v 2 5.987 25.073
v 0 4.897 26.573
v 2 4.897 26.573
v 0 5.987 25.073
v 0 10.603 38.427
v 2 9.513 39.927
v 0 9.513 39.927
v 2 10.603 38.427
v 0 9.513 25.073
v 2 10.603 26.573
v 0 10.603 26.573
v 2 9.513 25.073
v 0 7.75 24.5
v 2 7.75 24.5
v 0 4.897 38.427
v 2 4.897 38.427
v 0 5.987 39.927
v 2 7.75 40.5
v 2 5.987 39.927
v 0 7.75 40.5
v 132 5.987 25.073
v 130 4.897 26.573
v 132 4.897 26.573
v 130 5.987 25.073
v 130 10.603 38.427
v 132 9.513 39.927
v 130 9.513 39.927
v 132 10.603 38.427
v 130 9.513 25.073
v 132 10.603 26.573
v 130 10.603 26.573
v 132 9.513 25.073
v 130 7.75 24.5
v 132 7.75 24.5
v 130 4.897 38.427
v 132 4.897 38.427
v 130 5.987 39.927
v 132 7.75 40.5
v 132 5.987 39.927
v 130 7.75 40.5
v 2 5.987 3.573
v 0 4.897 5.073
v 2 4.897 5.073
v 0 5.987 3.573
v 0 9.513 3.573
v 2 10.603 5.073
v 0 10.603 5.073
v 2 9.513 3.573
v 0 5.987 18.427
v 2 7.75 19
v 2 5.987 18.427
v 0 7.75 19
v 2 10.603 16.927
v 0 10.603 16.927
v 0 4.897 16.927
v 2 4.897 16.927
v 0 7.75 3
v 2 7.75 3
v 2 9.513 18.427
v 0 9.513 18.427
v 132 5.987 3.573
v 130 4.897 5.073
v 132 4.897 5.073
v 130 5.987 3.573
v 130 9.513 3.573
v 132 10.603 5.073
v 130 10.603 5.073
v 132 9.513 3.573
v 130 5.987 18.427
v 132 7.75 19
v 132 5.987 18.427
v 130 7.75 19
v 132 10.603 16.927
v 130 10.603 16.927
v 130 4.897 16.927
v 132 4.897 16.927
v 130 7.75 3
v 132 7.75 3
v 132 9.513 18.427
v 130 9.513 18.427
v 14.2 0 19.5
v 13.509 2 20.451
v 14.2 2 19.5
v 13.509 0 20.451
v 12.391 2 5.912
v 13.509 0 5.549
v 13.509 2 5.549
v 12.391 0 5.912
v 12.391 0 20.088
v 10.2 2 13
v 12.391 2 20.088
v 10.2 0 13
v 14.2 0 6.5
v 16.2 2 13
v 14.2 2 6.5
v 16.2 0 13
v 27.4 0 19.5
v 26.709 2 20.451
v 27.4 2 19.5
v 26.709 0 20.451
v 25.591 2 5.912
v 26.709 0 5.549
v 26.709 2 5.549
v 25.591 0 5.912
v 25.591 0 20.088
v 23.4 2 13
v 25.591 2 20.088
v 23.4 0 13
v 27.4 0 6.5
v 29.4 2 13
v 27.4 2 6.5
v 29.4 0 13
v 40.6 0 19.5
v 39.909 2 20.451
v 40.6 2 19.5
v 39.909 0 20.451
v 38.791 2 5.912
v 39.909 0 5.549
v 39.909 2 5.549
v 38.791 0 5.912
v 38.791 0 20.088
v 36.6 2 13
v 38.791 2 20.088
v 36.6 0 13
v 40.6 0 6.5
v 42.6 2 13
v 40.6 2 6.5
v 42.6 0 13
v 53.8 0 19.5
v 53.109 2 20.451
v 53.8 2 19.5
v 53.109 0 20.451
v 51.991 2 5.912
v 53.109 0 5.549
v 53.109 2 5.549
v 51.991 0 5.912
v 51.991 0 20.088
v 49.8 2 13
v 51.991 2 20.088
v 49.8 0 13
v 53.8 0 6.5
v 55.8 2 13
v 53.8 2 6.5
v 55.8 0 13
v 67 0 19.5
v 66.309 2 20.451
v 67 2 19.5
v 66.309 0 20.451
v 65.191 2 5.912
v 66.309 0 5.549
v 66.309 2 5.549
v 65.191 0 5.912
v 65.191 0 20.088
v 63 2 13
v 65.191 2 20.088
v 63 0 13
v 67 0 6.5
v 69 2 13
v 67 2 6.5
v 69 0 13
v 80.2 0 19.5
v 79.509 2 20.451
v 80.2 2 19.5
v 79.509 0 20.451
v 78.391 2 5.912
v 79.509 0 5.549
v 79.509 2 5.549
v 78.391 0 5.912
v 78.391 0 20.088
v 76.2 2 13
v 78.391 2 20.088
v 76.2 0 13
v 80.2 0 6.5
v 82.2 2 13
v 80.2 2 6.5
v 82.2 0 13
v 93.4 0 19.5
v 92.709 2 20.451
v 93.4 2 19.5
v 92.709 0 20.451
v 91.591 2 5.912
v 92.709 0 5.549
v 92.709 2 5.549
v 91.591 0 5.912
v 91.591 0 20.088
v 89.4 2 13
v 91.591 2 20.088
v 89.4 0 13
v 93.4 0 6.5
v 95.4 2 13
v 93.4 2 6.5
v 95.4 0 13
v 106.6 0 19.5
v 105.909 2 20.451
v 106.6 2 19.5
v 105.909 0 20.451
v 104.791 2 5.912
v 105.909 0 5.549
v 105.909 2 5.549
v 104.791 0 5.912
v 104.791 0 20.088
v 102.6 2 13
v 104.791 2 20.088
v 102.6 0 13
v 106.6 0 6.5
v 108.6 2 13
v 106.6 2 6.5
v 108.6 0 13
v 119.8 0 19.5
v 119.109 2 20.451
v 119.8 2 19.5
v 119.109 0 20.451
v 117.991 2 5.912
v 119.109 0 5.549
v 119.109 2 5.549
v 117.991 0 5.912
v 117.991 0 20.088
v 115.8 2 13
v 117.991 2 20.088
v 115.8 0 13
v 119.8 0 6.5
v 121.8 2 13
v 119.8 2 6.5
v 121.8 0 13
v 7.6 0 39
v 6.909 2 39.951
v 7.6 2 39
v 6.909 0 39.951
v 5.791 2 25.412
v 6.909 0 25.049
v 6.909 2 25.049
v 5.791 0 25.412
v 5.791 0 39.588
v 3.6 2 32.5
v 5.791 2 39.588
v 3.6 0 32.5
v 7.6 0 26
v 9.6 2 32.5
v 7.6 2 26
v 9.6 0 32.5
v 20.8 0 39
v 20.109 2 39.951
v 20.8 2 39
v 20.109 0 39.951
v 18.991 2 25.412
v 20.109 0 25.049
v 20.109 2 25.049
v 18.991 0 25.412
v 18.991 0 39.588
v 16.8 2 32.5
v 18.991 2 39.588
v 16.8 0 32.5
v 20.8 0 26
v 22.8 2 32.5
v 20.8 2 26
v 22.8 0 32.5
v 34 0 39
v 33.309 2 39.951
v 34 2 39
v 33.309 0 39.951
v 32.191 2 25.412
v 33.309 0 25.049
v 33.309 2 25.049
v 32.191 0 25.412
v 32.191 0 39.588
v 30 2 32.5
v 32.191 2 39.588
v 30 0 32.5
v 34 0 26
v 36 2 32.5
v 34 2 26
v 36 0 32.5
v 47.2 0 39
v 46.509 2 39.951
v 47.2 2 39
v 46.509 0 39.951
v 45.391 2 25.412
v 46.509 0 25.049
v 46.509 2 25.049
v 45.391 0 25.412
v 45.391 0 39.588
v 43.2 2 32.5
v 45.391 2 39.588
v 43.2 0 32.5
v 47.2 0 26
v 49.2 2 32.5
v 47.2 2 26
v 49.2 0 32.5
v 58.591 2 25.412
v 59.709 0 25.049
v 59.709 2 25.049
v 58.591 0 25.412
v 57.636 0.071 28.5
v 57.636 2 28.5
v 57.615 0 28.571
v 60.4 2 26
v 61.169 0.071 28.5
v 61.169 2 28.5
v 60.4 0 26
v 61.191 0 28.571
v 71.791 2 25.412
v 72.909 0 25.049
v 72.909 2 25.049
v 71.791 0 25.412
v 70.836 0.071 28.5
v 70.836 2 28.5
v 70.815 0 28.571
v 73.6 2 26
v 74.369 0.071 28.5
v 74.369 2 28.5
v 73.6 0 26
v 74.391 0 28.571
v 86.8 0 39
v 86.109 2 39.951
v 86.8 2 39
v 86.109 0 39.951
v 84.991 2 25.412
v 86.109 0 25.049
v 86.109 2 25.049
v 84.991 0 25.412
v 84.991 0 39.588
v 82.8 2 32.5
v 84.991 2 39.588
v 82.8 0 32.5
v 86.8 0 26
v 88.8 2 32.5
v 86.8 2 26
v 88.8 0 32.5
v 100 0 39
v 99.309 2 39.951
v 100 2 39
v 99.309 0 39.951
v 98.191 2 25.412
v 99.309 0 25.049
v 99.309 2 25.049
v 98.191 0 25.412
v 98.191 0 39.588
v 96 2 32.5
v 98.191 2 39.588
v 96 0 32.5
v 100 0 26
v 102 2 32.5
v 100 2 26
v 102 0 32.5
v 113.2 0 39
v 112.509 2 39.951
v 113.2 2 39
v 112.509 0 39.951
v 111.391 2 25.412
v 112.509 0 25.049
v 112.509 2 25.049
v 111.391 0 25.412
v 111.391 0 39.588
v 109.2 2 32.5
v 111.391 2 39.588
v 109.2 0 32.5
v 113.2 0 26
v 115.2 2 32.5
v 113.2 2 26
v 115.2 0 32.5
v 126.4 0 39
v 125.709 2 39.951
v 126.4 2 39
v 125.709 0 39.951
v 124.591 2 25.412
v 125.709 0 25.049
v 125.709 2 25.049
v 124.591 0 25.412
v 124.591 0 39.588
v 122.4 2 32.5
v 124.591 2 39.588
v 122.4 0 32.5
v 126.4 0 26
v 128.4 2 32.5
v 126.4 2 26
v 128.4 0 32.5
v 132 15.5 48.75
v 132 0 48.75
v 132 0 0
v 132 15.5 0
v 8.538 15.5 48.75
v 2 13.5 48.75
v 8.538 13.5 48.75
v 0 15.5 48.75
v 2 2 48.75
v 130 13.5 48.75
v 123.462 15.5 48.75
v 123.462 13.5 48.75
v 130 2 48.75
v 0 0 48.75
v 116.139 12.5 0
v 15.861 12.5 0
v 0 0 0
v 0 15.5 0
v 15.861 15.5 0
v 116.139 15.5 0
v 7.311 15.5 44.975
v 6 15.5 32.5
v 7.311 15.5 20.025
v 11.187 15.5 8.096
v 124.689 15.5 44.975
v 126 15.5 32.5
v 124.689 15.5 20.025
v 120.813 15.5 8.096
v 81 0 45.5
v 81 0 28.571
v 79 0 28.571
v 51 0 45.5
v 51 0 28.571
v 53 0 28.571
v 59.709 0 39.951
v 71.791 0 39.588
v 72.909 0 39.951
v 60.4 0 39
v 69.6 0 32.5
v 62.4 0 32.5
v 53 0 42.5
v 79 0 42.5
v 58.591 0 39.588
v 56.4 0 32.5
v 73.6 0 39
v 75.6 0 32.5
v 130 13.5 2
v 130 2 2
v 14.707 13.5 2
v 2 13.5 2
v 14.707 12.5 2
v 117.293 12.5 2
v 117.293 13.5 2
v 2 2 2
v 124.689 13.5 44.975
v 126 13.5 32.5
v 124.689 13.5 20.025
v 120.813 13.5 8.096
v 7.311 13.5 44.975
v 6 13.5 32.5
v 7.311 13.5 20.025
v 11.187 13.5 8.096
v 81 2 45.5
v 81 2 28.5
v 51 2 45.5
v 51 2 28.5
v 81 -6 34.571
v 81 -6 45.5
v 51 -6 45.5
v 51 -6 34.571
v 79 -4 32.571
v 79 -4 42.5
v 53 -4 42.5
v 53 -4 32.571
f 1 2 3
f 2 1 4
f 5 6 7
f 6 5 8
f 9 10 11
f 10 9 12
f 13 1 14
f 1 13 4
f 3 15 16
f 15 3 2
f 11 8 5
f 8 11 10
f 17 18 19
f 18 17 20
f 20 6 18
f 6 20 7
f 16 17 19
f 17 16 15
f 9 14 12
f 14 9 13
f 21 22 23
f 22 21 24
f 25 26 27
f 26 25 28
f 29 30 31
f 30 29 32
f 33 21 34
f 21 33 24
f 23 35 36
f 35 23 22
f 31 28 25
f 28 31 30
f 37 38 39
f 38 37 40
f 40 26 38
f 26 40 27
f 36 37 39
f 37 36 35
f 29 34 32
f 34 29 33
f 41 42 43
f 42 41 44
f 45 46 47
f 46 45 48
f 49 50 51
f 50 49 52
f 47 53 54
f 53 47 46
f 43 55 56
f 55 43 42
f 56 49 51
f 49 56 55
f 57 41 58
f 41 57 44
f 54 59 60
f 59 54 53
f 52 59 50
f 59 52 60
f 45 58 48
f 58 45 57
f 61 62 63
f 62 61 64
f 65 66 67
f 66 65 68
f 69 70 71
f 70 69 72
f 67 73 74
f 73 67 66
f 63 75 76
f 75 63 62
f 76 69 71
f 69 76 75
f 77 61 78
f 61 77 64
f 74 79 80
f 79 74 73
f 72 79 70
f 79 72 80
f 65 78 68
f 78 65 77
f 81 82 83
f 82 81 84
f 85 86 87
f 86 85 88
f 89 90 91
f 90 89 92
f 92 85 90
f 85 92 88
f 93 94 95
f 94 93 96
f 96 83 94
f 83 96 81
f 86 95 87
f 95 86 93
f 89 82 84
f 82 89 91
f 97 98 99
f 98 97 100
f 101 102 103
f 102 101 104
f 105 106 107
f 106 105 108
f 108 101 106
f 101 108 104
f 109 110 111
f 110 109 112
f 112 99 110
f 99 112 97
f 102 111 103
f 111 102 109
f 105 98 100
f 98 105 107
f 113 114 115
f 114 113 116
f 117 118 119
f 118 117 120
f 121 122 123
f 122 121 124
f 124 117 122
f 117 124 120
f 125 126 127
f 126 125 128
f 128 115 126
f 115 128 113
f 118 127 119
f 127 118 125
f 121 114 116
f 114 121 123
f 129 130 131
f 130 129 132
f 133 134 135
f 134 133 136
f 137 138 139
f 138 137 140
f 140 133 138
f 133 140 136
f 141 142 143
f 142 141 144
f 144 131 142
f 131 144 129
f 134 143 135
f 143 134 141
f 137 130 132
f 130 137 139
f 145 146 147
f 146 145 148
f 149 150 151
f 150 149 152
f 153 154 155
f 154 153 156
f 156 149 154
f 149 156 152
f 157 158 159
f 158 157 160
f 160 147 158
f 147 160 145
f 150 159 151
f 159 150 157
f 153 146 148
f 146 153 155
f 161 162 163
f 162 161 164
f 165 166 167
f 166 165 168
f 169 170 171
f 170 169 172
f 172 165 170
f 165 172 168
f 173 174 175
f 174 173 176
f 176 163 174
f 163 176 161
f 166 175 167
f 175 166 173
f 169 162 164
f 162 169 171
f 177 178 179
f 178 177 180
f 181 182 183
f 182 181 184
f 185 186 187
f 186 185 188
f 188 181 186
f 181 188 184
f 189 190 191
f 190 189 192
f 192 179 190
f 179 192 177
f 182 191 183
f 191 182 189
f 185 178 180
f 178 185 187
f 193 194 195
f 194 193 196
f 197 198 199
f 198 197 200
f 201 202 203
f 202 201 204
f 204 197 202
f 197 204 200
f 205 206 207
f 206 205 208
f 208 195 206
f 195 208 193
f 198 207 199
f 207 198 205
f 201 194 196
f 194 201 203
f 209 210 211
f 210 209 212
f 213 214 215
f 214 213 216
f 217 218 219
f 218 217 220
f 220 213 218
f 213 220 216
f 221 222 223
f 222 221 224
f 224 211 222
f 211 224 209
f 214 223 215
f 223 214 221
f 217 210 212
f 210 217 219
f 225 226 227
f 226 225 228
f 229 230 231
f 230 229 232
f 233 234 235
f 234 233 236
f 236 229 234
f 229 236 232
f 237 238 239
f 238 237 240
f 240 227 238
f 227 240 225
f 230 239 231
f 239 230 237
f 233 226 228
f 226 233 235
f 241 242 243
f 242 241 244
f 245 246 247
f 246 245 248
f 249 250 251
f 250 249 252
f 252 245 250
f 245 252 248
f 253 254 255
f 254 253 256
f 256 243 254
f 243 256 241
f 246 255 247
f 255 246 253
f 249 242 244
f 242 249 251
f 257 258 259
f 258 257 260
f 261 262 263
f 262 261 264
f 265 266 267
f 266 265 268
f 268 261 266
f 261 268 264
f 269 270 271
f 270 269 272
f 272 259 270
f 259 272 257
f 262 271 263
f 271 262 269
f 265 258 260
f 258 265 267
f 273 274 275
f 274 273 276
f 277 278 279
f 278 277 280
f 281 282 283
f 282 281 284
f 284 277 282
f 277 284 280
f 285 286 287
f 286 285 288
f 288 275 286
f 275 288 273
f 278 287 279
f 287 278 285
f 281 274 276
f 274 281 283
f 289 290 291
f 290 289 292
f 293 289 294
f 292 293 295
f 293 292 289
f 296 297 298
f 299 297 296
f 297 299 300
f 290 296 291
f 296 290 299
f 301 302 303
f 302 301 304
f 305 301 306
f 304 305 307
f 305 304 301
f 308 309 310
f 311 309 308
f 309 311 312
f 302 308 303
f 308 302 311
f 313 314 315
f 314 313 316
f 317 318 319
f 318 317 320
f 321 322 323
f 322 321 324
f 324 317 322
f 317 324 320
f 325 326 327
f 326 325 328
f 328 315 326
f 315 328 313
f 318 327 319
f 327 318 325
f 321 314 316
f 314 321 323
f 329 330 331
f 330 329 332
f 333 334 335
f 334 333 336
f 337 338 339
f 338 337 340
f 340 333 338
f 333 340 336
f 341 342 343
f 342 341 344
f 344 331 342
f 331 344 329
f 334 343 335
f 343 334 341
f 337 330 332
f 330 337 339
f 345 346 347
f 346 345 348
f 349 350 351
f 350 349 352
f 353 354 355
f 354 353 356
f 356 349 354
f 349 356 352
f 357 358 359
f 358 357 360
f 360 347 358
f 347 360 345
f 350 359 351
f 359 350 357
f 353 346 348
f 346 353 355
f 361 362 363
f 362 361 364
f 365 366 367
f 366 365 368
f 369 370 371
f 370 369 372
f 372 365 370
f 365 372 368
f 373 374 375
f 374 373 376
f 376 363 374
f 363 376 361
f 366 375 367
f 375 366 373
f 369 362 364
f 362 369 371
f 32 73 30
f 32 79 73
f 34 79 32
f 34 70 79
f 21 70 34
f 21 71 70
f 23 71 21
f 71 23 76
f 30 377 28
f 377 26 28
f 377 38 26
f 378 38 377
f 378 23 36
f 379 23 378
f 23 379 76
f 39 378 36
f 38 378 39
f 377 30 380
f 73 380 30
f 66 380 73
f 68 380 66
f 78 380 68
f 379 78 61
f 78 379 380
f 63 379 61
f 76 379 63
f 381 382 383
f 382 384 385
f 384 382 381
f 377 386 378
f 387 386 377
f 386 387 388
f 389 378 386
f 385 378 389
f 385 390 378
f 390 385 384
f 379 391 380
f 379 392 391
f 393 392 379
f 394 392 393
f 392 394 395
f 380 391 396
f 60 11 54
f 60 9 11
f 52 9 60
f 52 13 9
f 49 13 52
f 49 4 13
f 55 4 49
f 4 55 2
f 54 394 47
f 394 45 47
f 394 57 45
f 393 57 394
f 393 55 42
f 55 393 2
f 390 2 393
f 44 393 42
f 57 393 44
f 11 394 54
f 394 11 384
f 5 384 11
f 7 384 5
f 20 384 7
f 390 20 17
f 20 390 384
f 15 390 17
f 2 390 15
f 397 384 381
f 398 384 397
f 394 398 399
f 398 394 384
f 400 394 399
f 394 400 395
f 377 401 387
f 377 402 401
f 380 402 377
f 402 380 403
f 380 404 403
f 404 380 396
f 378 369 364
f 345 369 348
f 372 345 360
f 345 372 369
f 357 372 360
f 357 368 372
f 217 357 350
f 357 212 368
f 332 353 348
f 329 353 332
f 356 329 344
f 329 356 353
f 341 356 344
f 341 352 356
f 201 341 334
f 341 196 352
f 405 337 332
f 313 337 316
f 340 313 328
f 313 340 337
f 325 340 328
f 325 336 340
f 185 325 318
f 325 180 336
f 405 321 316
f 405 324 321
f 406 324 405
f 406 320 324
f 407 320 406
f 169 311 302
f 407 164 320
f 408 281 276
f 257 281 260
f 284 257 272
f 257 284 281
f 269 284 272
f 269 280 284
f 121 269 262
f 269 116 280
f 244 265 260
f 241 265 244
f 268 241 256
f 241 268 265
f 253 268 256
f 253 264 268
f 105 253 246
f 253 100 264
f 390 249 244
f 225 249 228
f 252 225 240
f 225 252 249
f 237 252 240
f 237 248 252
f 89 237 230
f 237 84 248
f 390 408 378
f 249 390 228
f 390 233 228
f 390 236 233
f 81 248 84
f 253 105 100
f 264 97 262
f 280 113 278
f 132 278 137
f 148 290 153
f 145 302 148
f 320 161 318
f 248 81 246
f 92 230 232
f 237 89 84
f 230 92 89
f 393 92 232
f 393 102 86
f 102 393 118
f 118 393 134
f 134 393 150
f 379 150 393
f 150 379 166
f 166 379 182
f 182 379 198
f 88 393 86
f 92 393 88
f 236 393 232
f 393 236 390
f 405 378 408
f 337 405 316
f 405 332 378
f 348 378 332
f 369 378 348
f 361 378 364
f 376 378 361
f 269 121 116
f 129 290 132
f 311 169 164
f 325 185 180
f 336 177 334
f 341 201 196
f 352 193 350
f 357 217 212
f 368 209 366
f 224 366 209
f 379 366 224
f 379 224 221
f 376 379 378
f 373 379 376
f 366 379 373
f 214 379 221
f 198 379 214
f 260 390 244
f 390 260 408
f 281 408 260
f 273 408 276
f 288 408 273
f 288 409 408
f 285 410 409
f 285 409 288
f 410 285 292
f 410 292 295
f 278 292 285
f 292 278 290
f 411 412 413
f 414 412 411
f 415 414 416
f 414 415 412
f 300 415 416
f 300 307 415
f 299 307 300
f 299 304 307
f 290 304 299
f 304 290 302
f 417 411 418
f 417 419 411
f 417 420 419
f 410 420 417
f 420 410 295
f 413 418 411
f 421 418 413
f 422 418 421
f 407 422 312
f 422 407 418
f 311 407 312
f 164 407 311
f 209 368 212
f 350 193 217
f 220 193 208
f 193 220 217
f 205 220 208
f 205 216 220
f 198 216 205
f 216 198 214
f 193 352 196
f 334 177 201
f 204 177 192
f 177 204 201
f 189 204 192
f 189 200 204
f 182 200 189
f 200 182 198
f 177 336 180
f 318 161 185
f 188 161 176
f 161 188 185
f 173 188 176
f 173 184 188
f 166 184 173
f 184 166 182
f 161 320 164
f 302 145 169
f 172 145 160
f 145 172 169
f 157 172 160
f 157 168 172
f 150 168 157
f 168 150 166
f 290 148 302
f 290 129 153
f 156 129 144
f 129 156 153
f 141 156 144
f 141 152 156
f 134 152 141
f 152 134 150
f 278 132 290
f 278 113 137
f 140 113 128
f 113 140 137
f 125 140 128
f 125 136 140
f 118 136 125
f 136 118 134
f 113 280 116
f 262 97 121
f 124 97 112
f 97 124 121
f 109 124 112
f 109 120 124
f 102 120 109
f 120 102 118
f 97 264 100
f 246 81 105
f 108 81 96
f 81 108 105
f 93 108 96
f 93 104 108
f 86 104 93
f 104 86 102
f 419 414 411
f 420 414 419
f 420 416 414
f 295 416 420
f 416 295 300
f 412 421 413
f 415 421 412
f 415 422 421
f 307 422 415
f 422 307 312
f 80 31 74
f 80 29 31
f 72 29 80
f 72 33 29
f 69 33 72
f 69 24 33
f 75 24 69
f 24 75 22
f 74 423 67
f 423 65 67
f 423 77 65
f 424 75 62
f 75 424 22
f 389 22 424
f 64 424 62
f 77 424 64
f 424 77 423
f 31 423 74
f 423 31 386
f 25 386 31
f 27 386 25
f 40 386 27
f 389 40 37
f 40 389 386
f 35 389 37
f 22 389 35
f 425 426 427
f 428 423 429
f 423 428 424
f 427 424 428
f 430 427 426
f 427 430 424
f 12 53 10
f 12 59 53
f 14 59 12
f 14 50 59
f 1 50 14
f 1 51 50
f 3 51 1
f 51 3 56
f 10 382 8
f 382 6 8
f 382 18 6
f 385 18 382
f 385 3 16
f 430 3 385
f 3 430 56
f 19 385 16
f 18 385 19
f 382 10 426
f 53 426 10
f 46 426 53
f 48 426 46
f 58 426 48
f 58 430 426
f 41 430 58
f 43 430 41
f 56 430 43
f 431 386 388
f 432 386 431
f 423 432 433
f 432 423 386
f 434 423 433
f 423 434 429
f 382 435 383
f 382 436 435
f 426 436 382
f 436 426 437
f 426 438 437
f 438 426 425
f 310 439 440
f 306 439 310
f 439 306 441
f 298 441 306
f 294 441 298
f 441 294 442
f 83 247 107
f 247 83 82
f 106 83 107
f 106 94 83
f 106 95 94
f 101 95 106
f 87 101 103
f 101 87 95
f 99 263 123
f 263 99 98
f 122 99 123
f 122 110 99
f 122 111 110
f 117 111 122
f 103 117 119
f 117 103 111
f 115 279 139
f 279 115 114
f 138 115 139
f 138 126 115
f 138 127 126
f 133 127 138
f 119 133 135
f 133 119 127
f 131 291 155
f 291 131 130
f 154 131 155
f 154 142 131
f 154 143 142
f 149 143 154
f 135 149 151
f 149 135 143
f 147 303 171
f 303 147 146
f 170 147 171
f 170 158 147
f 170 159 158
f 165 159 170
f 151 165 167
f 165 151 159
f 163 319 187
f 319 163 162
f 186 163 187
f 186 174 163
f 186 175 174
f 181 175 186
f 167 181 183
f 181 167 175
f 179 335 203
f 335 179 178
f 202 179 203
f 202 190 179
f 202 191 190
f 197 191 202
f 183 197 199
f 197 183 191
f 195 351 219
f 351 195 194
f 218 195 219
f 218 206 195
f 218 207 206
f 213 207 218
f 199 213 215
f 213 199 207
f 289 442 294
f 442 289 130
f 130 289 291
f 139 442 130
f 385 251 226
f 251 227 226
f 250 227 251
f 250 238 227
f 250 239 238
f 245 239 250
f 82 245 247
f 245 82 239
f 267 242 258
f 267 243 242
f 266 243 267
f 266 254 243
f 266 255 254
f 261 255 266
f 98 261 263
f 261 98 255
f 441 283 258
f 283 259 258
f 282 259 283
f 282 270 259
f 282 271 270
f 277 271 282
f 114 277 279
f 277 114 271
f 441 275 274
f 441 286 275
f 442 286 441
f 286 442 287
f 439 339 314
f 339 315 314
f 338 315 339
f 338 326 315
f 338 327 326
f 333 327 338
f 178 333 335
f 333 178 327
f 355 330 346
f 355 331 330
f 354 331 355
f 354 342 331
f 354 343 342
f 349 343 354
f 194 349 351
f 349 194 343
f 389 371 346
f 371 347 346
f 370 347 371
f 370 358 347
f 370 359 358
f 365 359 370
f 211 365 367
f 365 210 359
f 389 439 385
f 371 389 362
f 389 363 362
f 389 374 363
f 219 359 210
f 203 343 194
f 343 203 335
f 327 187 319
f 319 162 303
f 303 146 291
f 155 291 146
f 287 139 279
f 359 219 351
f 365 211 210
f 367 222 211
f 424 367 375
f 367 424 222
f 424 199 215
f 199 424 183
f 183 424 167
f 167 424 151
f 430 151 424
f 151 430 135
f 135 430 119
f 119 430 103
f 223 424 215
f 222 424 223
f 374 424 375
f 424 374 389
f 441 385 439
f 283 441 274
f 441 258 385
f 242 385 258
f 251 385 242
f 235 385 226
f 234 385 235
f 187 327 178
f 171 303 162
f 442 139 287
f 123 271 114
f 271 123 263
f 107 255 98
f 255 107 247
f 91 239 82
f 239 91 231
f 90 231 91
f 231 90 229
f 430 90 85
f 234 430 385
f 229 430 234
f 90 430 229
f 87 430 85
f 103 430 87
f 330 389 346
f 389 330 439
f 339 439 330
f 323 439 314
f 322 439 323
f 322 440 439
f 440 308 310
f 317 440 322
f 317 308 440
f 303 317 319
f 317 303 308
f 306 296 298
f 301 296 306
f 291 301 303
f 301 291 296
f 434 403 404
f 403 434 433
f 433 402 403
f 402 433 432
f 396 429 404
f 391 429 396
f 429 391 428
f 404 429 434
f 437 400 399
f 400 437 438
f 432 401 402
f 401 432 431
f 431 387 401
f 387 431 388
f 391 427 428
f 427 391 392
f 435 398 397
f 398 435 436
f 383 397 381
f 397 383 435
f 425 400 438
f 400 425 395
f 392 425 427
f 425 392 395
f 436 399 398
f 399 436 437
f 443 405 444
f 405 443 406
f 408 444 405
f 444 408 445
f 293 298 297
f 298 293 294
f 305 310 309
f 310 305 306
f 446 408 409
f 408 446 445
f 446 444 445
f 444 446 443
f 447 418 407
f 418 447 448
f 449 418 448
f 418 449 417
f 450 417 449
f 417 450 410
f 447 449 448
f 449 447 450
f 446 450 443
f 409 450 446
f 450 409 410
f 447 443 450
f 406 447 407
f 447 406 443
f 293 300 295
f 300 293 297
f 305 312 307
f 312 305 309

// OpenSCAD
// Width of the phone when held in landscape (mm)
iPhoneWidth = 128;	
// Height of the phone when held in landscape (mm)	
iPhoneHeight = 63;
// Thickness of the phone (mm)
iPhoneDepth = 11.5; 
// Slots on Side (pick 2 for iphones)
slots = 2; // [1,2]	

/* [Hidden] */
mountThickness = 2; // How thick to make the base of the mount.

difference() {

// Main Box
	cube([iPhoneWidth+2*mountThickness,iPhoneDepth+2*mountThickness,3/4*(iPhoneHeight+mountThickness)]);
	translate([mountThickness,mountThickness,mountThickness]) cube([iPhoneWidth,iPhoneDepth,iPhoneHeight+mountThickness]);
	
// Front Cutout
	translate([(iPhoneWidth+2*mountThickness)/2,iPhoneDepth+mountThickness-1,(iPhoneHeight+mountThickness)/2])rotate([-90,0,0])cylinder(r=iPhoneWidth/2-4,h=mountThickness+2);

// Dual Slot Logic
    if (slots==2) { 
		// Lightning Adpators
        hull (){
            translate([mountThickness/2,(iPhoneDepth+2*mountThickness)/2, (iPhoneHeight+mountThickness)/2-5]) rotate ([0,90,0]) cylinder(r=3,h=mountThickness+2, center=true);
            translate([mountThickness/2,(iPhoneDepth+2*mountThickness)/2, (iPhoneHeight+mountThickness)/2+5]) rotate ([0,90,0]) cylinder(r=3,h=mountThickness+2, center=true);
        }

        hull () {
            translate([iPhoneWidth+mountThickness*1.5,(iPhoneDepth+2*mountThickness)/2, (iPhoneHeight+mountThickness)/2-5]) rotate ([0,90,0]) cylinder(r=3,h=mountThickness+2, center=true);
            translate([iPhoneWidth+1.5*mountThickness,(iPhoneDepth+2*mountThickness)/2, (iPhoneHeight+mountThickness)/2+5]) rotate ([0,90,0]) cylinder(r=3,h=mountThickness+2, center=true);
        }

		// Power Buttons
        hull () {
            translate([mountThickness/2,(iPhoneDepth+2*mountThickness)/2, mountThickness+4]) rotate ([0,90,0]) cylinder(r=3,h=mountThickness+2, center=true);
            translate([mountThickness/2,(iPhoneDepth+2*mountThickness)/2,mountThickness+14]) rotate ([0,90,0]) cylinder(r=3,h=mountThickness+2, center=true);
        }

        hull () {
            translate([iPhoneWidth+mountThickness*1.5,(iPhoneDepth+2*mountThickness)/2, mountThickness+4]) rotate ([0,90,0]) cylinder(r=3,h=mountThickness+2, center=true);
            translate([iPhoneWidth+1.5*mountThickness,(iPhoneDepth+2*mountThickness)/2, mountThickness+14]) rotate ([0,90,0]) cylinder(r=3,h=mountThickness+2, center=true);
        }
    }

// Single Slot Logic
    if (slots==1) {
    hull () {
            translate([mountThickness/2,(iPhoneDepth+2*mountThickness)/2, mountThickness+4]) rotate ([0,90,0]) cylinder(r=3,h=mountThickness+2, center=true);
            translate([mountThickness/2,(iPhoneDepth+2*mountThickness)/2,iPhoneHeight*3/4-5]) rotate ([0,90,0]) cylinder(r=3,h=mountThickness+2, center=true);
        }

        hull () {
            translate([iPhoneWidth+mountThickness*1.5,(iPhoneDepth+2*mountThickness)/2, mountThickness+4]) rotate ([0,90,0]) cylinder(r=3,h=mountThickness+2, center=true);
            translate([iPhoneWidth+1.5*mountThickness,(iPhoneDepth+2*mountThickness)/2, iPhoneHeight*3/4-5]) rotate ([0,90,0]) cylinder(r=3,h=mountThickness+2, center=true);
        }
    }

// Expansion Slots
for (z = [.1,.2,.3,.4,.5,.6,.7,.8,.9]) {
	hull () {
	translate([(iPhoneWidth+2*mountThickness)*z,mountThickness/2, (iPhoneHeight+mountThickness)*.30]) rotate ([90,0,0]) cylinder(r=1,h=mountThickness+2, center=true);
		translate([(iPhoneWidth+2*mountThickness)*z,mountThickness/2, (iPhoneHeight+mountThickness)*.20]) rotate ([90,0,0]) cylinder(r=3,h=mountThickness+2, center=true);
		translate([(iPhoneWidth+2*mountThickness)*z,mountThickness/2, (iPhoneHeight+mountThickness)*.10]) rotate ([90,0,0]) cylinder(r=1,h=mountThickness+2, center=true);
	}
}

for (z = [.05,.15,.25,.35,.45,.55,.65,.75,.85,.95]) {
	hull () {
		translate([(iPhoneWidth+2*mountThickness)*z,mountThickness/2, (iPhoneHeight+mountThickness)*.6]) rotate ([90,0,0]) cylinder(r=1,h=mountThickness+2, center=true);
		translate([(iPhoneWidth+2*mountThickness)*z,mountThickness/2, (iPhoneHeight+mountThickness)*.5]) rotate ([90,0,0]) cylinder(r=3,h=mountThickness+2, center=true);
		translate([(iPhoneWidth+2*mountThickness)*z,mountThickness/2, (iPhoneHeight+mountThickness)*.4]) rotate ([90,0,0]) cylinder(r=1,h=mountThickness+2, center=true);
	}
}


}

// Repair Base
difference() {
		cube([iPhoneWidth+2*mountThickness-4,iPhoneDepth+2*mountThickness-4,iPhoneHeight+mountThickness-4]);
	translate([-2,-2,mountThickness]) cube([iPhoneWidth+2*mountThickness+4,iPhoneDepth+2*mountThickness+4,iPhoneHeight+mountThickness+4]);
}

// Mount Attachement
difference() {
	translate([(iPhoneWidth+2*mountThickness)/2-15,-6,iPhoneHeight/2-3]) cube([30,6+mountThickness,17]);
	translate([(iPhoneWidth+2*mountThickness)/2-13,-4,iPhoneHeight/2-4]) cube([26,4,15]);
	translate([(iPhoneWidth+2*mountThickness)/2-16,0,iPhoneHeight/2-10]) rotate([45,0,0]) cube([32,5,15]);
}
